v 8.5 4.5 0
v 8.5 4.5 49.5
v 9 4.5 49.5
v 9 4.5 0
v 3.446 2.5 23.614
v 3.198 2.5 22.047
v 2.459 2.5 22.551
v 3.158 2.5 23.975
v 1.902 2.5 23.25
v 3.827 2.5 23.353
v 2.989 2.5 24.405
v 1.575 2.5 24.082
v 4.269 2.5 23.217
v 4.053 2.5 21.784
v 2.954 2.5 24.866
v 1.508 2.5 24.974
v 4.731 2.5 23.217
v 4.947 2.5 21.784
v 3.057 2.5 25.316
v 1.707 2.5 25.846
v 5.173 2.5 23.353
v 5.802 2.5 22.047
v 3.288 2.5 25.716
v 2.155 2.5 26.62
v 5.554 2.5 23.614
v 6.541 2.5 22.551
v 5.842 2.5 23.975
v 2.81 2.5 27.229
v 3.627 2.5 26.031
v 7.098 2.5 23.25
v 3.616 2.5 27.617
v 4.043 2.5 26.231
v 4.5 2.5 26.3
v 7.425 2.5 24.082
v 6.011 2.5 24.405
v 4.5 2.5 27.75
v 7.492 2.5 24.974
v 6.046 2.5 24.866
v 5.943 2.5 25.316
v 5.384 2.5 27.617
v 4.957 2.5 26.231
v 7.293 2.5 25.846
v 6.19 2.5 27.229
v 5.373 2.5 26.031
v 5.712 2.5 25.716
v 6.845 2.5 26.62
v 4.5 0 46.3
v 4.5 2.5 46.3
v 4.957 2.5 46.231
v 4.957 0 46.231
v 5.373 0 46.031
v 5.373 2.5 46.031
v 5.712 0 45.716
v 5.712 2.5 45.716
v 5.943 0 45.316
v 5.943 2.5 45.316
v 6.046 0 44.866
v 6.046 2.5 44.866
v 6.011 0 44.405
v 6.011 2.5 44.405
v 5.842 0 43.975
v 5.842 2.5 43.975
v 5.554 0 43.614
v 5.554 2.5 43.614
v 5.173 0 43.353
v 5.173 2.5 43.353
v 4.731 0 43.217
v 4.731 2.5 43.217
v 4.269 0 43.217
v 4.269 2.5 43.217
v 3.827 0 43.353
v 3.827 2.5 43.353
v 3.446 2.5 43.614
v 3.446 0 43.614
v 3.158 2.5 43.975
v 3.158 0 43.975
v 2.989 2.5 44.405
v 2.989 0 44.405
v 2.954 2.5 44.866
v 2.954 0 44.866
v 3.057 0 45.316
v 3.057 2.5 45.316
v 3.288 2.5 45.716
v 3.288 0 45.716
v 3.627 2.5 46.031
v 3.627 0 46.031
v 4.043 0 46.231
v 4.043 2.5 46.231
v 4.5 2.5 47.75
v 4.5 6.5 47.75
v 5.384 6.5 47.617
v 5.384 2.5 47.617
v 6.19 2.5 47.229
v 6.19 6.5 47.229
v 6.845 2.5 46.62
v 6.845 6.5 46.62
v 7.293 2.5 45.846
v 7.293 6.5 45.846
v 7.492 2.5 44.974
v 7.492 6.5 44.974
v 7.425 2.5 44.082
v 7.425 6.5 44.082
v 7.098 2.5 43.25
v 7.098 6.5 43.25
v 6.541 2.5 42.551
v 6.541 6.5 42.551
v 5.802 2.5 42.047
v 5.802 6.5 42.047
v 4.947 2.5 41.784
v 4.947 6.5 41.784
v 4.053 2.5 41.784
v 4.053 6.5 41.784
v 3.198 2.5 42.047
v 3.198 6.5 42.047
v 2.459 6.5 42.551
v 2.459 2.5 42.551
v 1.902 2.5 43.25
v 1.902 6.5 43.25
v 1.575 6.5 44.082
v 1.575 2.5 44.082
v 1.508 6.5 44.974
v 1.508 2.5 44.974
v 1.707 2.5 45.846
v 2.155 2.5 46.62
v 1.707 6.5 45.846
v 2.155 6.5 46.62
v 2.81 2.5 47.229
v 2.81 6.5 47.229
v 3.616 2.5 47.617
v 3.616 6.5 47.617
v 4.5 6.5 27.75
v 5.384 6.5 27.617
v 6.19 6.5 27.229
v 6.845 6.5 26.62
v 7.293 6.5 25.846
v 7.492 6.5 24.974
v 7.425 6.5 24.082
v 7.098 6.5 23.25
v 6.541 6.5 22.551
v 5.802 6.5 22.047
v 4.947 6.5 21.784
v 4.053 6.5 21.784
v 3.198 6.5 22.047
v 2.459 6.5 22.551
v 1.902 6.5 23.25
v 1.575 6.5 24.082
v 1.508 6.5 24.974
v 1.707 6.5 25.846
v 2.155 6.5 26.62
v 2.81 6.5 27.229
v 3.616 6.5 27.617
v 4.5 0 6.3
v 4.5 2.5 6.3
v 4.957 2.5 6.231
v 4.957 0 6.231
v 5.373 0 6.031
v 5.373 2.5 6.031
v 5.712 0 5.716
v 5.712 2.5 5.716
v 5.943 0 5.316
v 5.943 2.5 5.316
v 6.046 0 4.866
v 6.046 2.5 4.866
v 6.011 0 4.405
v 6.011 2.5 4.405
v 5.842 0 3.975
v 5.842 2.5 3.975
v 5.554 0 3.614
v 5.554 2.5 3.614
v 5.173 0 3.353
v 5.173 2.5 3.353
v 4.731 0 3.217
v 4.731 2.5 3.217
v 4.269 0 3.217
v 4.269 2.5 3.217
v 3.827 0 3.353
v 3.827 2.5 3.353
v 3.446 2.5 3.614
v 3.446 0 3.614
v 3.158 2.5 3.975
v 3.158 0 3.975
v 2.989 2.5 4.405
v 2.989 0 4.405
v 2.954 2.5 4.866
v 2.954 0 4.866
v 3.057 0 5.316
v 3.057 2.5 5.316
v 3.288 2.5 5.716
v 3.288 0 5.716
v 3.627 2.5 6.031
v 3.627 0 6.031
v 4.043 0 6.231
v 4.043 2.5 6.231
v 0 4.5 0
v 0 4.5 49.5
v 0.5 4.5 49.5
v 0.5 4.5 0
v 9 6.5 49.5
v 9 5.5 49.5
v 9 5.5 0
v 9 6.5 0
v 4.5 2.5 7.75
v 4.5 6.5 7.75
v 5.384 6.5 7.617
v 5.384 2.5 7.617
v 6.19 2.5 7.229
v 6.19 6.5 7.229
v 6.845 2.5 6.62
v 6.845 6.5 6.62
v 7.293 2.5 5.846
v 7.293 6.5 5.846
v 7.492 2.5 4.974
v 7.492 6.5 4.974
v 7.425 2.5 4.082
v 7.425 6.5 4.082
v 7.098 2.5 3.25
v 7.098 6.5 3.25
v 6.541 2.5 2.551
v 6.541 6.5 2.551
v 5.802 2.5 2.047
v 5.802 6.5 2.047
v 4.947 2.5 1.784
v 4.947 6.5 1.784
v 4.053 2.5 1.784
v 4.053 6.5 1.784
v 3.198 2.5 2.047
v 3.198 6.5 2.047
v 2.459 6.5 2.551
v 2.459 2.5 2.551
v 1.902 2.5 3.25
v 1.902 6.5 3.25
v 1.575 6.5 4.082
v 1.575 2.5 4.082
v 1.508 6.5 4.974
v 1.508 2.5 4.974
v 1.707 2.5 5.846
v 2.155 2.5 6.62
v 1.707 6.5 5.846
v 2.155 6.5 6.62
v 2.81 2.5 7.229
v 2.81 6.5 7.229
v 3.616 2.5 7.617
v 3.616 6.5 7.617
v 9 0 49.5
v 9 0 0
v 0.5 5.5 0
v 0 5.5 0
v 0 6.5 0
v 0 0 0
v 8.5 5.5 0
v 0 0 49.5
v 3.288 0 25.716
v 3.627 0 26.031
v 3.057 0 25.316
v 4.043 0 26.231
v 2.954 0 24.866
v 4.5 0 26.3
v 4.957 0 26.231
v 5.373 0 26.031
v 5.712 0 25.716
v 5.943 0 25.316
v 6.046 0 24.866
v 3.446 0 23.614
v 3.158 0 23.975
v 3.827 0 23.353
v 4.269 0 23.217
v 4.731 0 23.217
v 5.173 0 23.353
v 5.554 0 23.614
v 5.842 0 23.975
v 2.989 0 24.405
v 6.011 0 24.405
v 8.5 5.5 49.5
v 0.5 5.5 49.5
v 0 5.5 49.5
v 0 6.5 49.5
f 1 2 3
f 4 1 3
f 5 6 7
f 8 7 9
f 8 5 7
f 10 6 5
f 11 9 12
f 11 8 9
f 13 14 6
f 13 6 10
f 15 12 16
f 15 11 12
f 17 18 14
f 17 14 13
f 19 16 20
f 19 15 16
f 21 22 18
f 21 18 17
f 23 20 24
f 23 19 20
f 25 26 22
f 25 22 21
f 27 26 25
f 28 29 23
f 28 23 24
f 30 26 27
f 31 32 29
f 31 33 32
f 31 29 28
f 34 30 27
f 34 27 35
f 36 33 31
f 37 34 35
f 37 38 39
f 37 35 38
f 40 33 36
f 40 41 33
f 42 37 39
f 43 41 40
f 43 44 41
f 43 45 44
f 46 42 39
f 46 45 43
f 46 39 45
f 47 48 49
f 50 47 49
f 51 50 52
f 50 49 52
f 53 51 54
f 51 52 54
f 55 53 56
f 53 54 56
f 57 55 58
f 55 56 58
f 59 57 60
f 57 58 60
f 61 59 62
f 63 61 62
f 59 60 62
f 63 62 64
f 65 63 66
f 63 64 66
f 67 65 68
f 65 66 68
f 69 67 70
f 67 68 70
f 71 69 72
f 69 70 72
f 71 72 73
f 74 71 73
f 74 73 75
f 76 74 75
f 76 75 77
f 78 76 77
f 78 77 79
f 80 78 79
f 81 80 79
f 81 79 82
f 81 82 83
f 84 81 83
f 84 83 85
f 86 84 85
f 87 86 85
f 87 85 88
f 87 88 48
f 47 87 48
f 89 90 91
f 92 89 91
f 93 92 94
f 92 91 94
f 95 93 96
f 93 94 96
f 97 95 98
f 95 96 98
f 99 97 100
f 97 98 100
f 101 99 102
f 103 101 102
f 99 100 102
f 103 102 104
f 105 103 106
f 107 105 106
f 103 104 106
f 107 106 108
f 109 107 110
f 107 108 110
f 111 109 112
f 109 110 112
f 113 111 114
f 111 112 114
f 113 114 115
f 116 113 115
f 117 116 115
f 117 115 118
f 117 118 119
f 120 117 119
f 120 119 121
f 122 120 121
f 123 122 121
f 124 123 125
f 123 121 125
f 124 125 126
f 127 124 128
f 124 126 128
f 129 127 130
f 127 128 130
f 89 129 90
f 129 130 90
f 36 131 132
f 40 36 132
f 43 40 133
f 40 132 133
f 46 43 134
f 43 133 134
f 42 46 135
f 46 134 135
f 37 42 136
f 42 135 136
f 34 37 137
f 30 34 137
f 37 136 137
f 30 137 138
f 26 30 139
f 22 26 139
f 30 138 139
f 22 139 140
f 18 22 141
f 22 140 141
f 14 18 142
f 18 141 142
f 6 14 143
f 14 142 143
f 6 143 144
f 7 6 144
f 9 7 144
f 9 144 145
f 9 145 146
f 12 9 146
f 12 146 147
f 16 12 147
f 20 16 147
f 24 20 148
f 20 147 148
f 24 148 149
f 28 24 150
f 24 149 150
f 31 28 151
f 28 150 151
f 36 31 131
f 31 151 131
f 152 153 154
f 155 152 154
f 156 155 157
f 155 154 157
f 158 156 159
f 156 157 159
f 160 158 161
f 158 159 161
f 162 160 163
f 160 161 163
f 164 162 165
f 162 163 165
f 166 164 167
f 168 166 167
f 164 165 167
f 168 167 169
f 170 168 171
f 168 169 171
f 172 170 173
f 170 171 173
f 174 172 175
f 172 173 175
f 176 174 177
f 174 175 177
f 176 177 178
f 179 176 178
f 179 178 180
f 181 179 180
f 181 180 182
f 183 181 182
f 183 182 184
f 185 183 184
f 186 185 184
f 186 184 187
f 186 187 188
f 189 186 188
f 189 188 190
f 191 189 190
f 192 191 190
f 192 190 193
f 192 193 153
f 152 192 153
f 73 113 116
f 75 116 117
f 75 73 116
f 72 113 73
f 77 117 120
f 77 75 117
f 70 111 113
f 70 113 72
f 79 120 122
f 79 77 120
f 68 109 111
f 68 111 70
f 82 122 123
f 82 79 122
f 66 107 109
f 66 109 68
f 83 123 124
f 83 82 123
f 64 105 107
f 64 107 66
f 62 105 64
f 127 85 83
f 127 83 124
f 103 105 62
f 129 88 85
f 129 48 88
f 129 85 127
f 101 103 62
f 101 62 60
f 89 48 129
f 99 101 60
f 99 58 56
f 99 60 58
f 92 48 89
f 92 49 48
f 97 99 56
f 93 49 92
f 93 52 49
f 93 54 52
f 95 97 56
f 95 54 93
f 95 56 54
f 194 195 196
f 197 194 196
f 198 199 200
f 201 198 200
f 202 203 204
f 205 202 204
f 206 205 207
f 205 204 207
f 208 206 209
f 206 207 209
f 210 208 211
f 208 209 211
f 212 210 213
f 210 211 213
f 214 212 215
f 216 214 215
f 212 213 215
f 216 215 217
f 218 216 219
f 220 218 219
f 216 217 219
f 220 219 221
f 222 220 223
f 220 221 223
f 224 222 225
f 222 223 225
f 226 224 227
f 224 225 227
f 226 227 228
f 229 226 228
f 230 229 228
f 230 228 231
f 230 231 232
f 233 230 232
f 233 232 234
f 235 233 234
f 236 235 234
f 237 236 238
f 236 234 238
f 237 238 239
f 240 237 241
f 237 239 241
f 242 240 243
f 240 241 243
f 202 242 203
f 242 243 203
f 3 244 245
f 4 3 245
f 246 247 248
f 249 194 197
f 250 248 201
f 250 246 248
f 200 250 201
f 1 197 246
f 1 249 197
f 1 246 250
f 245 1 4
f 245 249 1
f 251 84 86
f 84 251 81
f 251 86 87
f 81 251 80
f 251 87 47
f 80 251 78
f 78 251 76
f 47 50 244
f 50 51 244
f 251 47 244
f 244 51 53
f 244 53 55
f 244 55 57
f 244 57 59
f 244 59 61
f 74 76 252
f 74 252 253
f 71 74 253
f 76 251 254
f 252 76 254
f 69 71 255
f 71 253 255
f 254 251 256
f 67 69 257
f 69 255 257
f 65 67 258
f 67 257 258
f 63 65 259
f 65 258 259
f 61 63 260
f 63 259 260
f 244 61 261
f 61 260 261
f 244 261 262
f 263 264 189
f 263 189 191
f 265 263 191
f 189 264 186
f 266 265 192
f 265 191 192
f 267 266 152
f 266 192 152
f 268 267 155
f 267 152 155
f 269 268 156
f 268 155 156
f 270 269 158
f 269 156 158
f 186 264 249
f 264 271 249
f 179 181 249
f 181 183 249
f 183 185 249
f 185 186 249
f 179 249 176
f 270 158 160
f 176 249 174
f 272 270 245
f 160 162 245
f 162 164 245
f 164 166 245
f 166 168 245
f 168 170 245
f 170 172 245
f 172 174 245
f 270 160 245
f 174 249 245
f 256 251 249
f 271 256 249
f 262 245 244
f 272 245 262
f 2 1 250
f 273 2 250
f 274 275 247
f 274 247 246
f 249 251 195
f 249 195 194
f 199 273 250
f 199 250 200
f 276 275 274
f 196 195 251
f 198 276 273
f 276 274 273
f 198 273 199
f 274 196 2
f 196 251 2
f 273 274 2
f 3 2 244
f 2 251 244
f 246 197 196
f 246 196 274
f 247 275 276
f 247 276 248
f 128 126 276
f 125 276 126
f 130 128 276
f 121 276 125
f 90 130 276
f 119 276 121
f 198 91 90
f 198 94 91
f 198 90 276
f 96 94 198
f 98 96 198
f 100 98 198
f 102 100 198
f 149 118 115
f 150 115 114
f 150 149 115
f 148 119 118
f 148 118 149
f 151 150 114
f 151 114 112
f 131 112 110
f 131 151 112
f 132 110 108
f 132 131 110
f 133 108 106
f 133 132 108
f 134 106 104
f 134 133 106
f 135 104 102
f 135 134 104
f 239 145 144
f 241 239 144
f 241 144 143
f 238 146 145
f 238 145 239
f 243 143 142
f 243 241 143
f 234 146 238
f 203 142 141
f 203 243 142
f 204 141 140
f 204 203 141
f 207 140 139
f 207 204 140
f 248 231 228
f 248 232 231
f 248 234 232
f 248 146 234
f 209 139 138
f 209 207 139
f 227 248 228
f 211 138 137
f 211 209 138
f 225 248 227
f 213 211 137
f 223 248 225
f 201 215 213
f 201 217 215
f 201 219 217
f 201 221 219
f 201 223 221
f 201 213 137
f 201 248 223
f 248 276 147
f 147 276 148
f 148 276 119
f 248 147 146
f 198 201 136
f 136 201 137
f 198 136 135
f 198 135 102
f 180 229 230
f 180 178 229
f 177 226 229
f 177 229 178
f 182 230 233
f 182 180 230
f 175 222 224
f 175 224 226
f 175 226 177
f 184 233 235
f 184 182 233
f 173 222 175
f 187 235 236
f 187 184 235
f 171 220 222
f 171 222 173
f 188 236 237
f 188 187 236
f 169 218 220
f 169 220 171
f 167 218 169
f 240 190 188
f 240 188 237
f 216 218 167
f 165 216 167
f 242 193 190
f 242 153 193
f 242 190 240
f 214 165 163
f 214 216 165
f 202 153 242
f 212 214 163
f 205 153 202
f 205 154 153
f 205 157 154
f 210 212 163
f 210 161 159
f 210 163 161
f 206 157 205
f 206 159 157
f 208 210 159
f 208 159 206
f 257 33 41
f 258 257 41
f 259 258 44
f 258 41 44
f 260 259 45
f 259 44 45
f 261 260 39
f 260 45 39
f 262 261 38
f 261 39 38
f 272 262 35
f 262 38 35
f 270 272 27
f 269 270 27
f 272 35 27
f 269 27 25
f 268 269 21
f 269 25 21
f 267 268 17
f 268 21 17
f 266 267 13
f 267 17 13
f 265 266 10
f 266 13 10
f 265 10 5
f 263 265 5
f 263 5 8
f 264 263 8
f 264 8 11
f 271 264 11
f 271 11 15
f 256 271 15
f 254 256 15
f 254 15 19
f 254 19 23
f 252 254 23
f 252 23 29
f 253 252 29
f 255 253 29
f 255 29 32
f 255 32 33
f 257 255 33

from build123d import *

# Parameters (mm, degrees)
SKETCH_1_W          = 9
SKETCH_1_H          = 49.5
EXTRUDE_1_DEPTH     = 6.5
SKETCH_2_R          = 1.55
CUT_EXTRUDE_1_DEPTH = 51.729675733
SKETCH_3_R          = 3
CUT_EXTRUDE_2_DEPTH = 4
SKETCH_4_W          = 0.5
SKETCH_4_H          = 1
CUT_EXTRUDE_3_DEPTH = 51.729675733


with BuildPart() as part:
    # 草图1 → 凸台-拉伸1 (new body)
    with BuildSketch(Plane(origin=(0, 0, 0), x_dir=(1, 0, 0), z_dir=(0, 1, 0))):
        with Locations((4.5, -24.75)):
            Rectangle(SKETCH_1_W, SKETCH_1_H)
    extrude(amount=EXTRUDE_1_DEPTH)

    # 草图2 → 切除-拉伸1 (cut, through all)
    with BuildSketch(Plane(origin=(0, 6.5, 0), x_dir=(1, 0, 0), z_dir=(0, 1, 0))):
        with Locations(Location((4.5, -24.75, 0), (0, 0, 270))):
            Circle(SKETCH_2_R)
        with Locations(Location((4.5, -4.75, 0), (0, 0, 270))):
            Circle(SKETCH_2_R)
        with Locations(Location((4.5, -44.75, 0), (0, 0, 270))):
            Circle(SKETCH_2_R)
    extrude(amount=-CUT_EXTRUDE_1_DEPTH, mode=Mode.SUBTRACT)

    # 草图3 → 切除-拉伸2 (cut)
    with BuildSketch(Plane(origin=(0, 6.5, 0), x_dir=(1, 0, 0), z_dir=(0, 1, 0))):
        with Locations(Location((4.5, -44.75, 0), (0, 0, 270))):
            Circle(SKETCH_3_R)
        with Locations(Location((4.5, -24.75, 0), (0, 0, 270))):
            Circle(SKETCH_3_R)
        with Locations(Location((4.5, -4.75, 0), (0, 0, 270))):
            Circle(SKETCH_3_R)
    extrude(amount=-CUT_EXTRUDE_2_DEPTH, mode=Mode.SUBTRACT)

    # 草图4 → 切除-拉伸3 (cut, through all)
    with BuildSketch(Plane.XY.offset(49.5)):
        with Locations((0.25, 5)):
            Rectangle(SKETCH_4_W, SKETCH_4_H)
        with Locations((8.75, 5)):
            Rectangle(SKETCH_4_W, SKETCH_4_H)
    extrude(amount=-CUT_EXTRUDE_3_DEPTH, mode=Mode.SUBTRACT)


solid = part.part
